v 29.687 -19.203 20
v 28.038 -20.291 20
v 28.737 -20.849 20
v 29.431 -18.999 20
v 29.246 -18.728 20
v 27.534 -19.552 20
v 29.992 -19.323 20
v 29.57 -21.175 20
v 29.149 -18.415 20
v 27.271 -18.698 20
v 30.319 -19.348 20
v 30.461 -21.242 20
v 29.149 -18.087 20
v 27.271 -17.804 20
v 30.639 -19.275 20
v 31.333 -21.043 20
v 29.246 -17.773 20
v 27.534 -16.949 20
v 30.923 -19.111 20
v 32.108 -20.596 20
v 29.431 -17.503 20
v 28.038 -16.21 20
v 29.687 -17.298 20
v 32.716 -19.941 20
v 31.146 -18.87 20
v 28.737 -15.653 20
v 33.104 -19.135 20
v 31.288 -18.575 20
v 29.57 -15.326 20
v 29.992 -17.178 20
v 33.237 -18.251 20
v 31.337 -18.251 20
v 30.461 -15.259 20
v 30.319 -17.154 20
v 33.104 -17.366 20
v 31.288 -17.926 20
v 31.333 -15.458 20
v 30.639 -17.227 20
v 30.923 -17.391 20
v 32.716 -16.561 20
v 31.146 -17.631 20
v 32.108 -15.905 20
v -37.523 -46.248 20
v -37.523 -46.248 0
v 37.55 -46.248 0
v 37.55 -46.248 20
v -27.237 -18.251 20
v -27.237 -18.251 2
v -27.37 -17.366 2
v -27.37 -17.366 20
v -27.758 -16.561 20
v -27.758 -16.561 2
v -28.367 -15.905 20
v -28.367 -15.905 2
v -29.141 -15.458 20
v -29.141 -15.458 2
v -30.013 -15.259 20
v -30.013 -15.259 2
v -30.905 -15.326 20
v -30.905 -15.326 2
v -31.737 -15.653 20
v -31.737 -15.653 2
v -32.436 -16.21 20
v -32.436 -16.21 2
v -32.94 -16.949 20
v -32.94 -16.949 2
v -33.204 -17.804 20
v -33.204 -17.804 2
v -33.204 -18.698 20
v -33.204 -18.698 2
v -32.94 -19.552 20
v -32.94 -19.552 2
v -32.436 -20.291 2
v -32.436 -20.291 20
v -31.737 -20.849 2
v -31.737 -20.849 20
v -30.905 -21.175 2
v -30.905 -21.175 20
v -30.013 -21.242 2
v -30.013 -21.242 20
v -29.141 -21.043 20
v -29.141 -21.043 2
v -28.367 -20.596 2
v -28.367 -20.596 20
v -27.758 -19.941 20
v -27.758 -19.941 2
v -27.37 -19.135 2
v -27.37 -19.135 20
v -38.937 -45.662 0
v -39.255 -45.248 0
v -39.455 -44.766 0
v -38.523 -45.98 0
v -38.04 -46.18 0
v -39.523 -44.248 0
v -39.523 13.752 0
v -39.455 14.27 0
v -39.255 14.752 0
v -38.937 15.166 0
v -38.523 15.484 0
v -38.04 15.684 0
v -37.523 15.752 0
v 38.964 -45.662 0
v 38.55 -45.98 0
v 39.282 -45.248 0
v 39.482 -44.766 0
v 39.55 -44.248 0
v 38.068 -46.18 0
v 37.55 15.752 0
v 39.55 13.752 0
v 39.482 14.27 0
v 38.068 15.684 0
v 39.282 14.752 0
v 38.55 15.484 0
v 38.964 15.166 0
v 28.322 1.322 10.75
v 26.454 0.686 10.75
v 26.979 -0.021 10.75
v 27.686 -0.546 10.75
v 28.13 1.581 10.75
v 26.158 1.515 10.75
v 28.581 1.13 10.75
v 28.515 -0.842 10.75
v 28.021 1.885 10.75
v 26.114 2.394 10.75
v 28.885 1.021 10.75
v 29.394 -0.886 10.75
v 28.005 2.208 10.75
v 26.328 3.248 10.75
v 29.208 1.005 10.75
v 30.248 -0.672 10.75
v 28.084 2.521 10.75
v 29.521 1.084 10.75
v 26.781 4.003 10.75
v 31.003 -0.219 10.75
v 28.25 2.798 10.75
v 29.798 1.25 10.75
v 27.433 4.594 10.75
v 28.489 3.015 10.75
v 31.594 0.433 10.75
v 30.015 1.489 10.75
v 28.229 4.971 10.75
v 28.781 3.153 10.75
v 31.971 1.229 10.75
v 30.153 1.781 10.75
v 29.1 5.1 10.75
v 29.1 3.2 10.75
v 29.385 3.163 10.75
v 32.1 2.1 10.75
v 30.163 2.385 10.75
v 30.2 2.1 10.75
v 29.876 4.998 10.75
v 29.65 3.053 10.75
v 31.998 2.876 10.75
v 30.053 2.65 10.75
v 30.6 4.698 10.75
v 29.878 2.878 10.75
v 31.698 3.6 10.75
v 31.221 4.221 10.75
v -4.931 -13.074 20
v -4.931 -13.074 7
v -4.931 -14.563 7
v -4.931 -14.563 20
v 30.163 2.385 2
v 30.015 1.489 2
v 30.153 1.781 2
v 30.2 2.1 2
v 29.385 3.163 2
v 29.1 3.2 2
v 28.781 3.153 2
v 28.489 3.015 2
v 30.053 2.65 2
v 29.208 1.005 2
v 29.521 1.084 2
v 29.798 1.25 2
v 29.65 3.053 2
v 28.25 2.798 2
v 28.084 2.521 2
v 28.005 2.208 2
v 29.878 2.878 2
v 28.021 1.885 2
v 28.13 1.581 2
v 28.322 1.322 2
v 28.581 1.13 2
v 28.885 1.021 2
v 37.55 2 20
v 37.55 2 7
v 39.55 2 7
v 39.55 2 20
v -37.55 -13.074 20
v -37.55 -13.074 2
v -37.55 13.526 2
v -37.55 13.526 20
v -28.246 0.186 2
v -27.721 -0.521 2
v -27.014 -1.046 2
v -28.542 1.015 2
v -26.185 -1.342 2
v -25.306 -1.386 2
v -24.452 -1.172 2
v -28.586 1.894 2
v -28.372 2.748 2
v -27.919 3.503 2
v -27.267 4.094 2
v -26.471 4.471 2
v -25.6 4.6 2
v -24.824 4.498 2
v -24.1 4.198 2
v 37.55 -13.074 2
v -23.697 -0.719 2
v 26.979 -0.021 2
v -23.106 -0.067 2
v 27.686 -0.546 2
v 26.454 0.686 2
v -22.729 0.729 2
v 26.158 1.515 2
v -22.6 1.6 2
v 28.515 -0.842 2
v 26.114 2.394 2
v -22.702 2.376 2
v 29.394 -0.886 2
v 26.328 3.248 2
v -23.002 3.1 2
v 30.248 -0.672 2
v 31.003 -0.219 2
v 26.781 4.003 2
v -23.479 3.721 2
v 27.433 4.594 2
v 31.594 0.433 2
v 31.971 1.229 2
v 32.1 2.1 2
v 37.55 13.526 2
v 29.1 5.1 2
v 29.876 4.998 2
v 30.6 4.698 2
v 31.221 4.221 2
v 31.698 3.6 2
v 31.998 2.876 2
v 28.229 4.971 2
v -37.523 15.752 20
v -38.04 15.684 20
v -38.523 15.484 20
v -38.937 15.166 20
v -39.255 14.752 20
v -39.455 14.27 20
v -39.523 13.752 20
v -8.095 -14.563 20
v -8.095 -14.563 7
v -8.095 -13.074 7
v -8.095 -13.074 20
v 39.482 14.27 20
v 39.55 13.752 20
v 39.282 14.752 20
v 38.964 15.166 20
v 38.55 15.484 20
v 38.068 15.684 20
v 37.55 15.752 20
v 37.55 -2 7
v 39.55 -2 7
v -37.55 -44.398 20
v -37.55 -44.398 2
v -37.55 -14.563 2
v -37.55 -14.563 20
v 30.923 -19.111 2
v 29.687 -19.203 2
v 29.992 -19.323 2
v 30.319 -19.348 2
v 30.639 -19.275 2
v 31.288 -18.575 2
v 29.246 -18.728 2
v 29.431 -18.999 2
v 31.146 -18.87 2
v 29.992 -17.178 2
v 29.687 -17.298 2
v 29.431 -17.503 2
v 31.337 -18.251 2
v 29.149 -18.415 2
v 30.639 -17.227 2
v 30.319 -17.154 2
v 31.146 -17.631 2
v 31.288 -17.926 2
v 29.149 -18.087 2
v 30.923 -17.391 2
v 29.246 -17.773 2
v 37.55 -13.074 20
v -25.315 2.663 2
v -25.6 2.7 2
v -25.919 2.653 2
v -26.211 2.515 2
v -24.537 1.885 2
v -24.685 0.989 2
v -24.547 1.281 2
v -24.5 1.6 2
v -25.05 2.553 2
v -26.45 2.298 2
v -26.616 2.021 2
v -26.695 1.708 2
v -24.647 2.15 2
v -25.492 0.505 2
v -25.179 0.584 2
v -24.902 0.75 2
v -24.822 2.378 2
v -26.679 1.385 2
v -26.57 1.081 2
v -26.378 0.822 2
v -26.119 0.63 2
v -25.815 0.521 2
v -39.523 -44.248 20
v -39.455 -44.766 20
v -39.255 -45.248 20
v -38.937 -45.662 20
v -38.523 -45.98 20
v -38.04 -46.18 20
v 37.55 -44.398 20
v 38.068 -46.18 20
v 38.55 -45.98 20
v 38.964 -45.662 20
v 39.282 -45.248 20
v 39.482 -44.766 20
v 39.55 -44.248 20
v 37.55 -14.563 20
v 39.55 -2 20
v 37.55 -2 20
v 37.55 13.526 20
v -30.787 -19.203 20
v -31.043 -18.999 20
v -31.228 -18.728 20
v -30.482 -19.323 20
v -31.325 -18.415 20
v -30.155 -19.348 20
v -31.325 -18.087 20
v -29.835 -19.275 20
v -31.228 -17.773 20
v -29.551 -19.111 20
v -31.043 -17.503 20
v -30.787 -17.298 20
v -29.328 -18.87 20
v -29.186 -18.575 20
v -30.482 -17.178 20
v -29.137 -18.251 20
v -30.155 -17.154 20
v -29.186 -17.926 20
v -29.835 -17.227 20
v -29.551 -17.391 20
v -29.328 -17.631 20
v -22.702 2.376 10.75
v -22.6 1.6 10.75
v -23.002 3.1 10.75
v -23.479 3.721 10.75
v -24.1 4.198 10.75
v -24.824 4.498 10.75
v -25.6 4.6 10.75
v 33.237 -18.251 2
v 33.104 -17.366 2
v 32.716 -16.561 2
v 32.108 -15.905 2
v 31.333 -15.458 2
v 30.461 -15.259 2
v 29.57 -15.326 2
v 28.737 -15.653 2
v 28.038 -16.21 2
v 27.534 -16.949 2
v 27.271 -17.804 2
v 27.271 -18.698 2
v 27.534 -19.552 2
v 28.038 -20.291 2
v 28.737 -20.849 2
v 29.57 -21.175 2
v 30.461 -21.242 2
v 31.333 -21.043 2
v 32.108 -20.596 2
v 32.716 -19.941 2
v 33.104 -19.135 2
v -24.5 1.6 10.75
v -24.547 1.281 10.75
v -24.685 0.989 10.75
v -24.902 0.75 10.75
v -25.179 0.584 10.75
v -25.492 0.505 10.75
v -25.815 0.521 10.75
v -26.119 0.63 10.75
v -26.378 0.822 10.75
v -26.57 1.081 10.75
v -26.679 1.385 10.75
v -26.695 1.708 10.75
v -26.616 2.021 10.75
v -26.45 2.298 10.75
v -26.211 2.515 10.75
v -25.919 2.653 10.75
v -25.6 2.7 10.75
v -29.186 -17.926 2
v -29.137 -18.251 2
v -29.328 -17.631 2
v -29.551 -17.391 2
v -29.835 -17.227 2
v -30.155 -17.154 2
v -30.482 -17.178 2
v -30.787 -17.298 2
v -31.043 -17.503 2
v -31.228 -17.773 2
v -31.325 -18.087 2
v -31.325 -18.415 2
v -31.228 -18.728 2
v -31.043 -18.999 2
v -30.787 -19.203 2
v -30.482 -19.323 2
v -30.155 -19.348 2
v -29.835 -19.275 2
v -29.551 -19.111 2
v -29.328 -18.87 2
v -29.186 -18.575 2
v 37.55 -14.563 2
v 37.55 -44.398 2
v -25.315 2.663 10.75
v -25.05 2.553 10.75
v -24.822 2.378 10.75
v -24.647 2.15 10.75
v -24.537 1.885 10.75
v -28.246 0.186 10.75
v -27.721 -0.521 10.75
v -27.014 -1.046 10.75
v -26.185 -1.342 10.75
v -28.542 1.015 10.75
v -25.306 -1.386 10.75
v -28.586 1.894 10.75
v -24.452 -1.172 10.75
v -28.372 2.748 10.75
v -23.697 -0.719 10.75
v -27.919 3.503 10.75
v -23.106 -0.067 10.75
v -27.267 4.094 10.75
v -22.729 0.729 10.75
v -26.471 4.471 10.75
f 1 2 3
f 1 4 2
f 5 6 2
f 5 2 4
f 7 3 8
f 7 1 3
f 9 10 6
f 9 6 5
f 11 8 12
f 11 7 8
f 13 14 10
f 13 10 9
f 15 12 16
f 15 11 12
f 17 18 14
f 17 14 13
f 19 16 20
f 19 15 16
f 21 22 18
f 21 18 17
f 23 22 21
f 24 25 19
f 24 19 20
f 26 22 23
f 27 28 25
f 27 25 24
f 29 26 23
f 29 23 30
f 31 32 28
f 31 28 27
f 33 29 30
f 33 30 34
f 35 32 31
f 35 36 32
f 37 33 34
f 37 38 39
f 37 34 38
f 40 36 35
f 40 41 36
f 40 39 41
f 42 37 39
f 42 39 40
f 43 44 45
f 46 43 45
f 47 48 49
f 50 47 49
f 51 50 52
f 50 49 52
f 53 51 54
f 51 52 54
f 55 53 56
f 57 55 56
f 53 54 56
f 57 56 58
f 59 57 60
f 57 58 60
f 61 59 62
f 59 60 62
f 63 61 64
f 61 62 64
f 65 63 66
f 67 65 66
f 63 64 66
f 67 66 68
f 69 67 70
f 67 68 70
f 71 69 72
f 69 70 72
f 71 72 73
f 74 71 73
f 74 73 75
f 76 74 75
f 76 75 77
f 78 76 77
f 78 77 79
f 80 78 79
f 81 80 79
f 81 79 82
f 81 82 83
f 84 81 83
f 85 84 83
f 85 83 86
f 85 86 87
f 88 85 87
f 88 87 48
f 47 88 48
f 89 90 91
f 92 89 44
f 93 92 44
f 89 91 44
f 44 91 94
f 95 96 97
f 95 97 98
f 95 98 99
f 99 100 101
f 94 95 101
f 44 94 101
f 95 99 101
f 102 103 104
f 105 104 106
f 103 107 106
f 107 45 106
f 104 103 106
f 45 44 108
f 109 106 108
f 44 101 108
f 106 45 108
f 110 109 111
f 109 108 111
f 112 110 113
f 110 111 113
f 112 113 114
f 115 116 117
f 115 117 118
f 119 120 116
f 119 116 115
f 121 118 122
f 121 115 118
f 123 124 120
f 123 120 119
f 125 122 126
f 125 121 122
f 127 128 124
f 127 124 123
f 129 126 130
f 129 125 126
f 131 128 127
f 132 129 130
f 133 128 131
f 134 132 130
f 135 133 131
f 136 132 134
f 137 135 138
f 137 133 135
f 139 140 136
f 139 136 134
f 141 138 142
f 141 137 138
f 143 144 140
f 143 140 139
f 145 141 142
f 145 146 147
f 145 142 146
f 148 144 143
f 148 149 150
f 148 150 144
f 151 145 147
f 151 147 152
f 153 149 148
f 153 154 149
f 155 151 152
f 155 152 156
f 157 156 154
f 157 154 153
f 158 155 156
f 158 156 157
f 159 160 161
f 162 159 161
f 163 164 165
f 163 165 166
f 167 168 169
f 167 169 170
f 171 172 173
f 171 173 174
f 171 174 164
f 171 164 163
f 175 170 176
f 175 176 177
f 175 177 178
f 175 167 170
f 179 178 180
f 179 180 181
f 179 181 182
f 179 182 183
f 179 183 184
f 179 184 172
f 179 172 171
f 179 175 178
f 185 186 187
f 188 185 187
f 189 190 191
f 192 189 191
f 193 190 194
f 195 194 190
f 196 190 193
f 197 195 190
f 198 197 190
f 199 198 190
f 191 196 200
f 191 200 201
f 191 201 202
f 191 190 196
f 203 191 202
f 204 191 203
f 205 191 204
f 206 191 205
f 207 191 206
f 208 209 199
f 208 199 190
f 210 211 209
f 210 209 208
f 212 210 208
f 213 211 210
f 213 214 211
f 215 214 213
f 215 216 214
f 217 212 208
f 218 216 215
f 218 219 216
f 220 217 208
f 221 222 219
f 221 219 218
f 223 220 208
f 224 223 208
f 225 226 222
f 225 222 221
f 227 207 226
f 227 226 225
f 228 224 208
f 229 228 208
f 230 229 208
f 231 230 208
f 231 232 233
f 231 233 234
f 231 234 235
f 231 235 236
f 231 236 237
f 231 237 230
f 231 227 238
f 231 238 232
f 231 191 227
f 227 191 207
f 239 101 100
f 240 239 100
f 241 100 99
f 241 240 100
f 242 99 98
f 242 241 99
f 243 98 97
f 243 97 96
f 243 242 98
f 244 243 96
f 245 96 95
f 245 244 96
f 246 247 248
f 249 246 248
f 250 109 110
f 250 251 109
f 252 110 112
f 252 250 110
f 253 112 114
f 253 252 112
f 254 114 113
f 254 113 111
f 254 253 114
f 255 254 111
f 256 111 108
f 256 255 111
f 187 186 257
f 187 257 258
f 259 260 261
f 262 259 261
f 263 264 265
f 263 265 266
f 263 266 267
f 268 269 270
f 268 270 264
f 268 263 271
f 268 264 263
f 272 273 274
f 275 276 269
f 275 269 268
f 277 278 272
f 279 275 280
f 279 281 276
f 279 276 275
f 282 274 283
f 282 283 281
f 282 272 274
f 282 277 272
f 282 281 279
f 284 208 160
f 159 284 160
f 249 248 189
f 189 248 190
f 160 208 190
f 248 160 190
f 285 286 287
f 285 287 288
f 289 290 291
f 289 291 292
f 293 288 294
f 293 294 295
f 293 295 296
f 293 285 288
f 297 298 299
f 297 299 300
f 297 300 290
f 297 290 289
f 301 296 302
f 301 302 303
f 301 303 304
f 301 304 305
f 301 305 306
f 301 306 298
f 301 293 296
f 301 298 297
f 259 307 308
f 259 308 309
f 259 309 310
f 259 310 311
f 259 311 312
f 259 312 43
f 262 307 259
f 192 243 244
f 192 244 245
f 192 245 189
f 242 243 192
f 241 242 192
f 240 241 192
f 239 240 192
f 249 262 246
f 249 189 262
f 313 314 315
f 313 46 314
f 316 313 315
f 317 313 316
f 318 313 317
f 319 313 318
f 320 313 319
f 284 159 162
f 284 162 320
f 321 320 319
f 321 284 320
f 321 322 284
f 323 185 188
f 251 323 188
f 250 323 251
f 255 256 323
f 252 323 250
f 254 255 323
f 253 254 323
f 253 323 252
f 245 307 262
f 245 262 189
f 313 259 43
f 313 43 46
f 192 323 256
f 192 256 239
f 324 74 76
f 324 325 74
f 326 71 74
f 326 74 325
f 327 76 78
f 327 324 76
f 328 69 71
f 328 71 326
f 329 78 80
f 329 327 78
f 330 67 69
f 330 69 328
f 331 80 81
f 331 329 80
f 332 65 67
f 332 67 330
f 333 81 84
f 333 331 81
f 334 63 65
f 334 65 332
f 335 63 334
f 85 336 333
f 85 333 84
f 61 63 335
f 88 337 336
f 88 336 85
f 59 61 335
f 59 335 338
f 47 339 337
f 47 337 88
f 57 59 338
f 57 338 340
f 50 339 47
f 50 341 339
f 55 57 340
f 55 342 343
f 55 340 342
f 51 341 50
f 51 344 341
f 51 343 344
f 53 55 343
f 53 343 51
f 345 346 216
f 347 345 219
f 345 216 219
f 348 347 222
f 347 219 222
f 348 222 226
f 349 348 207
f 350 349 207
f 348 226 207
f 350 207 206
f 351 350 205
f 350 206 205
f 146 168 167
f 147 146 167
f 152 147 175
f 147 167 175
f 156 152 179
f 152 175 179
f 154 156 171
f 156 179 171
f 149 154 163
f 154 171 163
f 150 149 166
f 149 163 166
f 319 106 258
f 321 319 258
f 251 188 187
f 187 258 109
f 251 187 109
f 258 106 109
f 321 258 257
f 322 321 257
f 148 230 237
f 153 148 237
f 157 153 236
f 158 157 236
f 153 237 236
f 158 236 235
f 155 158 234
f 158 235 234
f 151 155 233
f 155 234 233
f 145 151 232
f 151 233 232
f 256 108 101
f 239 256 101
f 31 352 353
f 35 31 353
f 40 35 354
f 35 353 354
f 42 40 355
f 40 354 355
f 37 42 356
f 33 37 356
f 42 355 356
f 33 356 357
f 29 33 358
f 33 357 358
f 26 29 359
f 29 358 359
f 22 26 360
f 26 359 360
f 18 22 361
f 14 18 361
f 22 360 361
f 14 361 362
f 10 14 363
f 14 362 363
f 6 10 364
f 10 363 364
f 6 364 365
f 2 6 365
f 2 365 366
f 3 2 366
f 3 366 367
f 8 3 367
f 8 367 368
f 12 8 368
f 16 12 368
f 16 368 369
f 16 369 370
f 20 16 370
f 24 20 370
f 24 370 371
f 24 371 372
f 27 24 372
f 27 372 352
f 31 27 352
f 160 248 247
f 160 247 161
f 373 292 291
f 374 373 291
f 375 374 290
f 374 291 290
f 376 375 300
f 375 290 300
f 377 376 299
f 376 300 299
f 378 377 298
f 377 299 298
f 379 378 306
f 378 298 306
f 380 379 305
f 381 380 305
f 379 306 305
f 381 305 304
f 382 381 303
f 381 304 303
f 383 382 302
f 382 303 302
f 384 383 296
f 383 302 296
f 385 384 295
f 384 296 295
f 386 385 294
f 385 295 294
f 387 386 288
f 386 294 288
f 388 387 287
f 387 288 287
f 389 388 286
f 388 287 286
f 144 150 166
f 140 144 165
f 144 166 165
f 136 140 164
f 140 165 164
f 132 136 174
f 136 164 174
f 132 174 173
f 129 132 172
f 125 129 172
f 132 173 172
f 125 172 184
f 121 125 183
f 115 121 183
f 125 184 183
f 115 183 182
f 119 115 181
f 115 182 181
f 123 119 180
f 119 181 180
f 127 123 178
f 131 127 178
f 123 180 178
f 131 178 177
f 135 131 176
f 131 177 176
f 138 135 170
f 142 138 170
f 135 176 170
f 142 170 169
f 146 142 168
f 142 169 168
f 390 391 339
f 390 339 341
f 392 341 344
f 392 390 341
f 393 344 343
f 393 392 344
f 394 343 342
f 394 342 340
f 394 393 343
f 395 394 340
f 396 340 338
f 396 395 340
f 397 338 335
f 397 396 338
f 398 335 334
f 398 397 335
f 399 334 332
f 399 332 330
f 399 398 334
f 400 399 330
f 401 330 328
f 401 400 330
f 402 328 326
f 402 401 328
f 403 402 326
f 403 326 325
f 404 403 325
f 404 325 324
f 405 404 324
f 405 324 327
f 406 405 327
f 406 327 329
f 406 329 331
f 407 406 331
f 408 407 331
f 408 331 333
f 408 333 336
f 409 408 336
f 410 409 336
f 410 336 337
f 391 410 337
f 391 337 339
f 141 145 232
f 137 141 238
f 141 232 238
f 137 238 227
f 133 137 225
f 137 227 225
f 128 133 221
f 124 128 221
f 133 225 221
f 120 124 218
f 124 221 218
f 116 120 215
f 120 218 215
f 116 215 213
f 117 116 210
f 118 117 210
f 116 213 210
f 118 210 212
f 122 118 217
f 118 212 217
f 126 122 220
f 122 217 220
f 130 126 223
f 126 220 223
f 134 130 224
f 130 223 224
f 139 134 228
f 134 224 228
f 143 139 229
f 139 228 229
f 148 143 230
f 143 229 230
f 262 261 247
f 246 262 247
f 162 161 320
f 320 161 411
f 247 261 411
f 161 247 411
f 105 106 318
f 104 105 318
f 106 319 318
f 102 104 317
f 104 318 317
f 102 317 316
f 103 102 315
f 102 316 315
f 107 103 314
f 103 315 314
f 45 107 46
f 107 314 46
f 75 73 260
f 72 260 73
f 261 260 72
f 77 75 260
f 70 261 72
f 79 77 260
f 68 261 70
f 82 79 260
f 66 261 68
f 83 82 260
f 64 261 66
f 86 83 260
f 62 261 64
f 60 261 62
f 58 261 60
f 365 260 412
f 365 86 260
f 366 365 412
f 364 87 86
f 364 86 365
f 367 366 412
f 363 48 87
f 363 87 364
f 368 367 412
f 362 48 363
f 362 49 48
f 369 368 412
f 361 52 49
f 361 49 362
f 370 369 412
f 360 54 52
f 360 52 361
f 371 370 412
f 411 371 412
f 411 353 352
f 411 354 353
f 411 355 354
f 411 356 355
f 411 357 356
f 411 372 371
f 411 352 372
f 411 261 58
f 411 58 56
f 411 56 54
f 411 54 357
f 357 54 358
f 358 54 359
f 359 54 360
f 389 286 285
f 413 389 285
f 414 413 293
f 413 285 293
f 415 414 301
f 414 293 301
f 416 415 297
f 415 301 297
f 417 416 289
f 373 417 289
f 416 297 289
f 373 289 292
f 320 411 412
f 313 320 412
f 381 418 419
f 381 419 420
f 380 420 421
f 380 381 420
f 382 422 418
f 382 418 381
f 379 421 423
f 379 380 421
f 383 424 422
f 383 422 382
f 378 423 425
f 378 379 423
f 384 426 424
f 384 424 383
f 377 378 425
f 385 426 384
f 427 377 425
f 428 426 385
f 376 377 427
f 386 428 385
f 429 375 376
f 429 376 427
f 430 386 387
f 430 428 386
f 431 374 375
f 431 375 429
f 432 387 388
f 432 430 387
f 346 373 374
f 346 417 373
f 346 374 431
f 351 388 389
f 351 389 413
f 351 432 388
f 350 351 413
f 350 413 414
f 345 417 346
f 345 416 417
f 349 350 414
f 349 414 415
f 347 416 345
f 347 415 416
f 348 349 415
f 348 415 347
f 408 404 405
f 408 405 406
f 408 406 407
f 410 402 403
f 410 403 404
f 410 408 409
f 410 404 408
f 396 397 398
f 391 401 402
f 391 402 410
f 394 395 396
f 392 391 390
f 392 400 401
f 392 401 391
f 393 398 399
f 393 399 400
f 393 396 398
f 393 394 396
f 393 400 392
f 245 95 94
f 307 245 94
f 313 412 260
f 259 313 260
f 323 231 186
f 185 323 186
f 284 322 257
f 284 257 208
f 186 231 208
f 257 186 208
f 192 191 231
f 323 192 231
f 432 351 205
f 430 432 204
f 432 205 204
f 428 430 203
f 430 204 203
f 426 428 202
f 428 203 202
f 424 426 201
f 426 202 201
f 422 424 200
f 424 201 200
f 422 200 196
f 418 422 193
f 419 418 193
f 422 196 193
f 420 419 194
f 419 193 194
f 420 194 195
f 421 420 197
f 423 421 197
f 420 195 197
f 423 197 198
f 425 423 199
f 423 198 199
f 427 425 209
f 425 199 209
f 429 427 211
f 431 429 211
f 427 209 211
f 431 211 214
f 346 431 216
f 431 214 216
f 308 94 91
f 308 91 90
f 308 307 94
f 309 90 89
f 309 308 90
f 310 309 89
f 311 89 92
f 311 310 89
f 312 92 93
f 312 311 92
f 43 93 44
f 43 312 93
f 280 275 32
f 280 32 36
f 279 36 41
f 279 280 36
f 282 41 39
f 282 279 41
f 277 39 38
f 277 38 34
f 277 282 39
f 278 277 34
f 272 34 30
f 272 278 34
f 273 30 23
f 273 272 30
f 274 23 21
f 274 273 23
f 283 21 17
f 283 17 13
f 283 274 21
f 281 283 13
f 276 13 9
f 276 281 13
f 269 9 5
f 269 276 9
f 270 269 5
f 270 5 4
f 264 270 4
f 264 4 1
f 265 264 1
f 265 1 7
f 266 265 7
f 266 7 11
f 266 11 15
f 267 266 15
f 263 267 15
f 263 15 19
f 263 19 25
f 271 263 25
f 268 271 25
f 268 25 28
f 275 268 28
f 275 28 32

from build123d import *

# Parameters (mm, degrees)
F1_DEPTH = 20
F0_R     = 3
F0_R_2   = 1.1
F2_DEPTH = 2
F3_DEPTH = 10.75
F0_W     = 3.1642657705
F0_H     = 1.4890261218
F4_DEPTH = 7
F5_R     = 2


# Not quite as in the source:
# - a feature names something its author has since deleted; it is built from what else it names


with BuildPart() as f1:
    # F0 (on Top) → F1 (new body)
    with BuildSketch(Plane.XY):
        Polygon((-37.55, -13.0740804598), (-37.55, -12.1), (-37.55, 13.5259195402), (37.55, 13.5259195402), (37.55, 2.0000108369), (39.55, 2.0000108369), (39.55, 15.7519578086), (-39.5226512551, 15.7519578086), (-39.5226512551, -46.2480421914), (39.55, -46.2480421914), (39.55, -1.9999891631), (37.55, -1.9999891631), (37.55, -13.0740804598), (-4.9305087887, -13.0740804598), (-4.9305087887, -14.5631065816), (36.1, -14.5631065816), (37.55, -14.5631065816), (37.55, -44.3981406778), (-37.55, -44.3981406778), (-37.55, -14.5631065816), (-36.1, -14.5631065816), (-8.0947745591, -14.5631065816), (-8.0947745591, -13.0740804598), align=None)
    extrude(amount=F1_DEPTH)



with BuildPart() as f1b:
    # F0 (on Top) → F1, piece 2 (new body)
    with BuildSketch(Plane.XY):
        with Locations((-30.2370786667, -18.2506926358)):
            Circle(F0_R)
        with Locations((-30.2370786667, -18.2506926358)):
            Circle(F0_R_2, mode=Mode.SUBTRACT)
    extrude(amount=F1_DEPTH)


with BuildPart() as f1c:
    # F0 (on Top) → F1, piece 3 (new body)
    with BuildSketch(Plane.XY):
        with Locations((30.2370786667, -18.2506926358)):
            Circle(F0_R)
        with Locations((30.2370786667, -18.2506926358)):
            Circle(F0_R_2, mode=Mode.SUBTRACT)
    extrude(amount=F1_DEPTH)


with BuildPart() as f2:
    # F0 (on Top) → F2 (new body)
    with BuildSketch(Plane.XY):
        with BuildLine():
            Line((-25.6, 1.6), (-25.6, 2.7))
            ThreePointArc((-25.6, 2.7), (-26.3778174593, 0.8221825407), (-24.5, 1.6))
            Line((-24.5, 1.6), (-25.6, 1.6))
        make_face()
        with BuildLine():
            ThreePointArc((-24.5, 1.6), (-24.8221825407, 2.3778174593), (-25.6, 2.7))
            Line((-25.6, 2.7), (-25.6, 1.6))
            Line((-25.6, 1.6), (-24.5, 1.6))
        make_face()
    extrude(amount=F2_DEPTH)


with BuildPart() as f2b:
    # F0 (on Top) → F2, piece 2 (new body)
    with BuildSketch(Plane.XY):
        with BuildLine():
            ThreePointArc((30.2, 2.1), (29.8778174593, 2.8778174593), (29.1, 3.2))
            ThreePointArc((29.1, 3.2), (28.3221825407, 1.3221825407), (30.2, 2.1))
        make_face()
    extrude(amount=F2_DEPTH)


with BuildPart() as f1_1:
    add(f1.part)

    add(f1b.part)  # F2#3 merges F1b

    add(f1c.part)  # F2#3 merges F1c
    # F0 (on Top) → F2, piece 3 (join)
    with BuildSketch(Plane.XY):
        Polygon((-4.9305087887, -14.5631065816), (-8.0947745591, -14.5631065816), (-36.1, -14.5631065816), (-36.1, -42.9981406778), (36.1, -42.9981406778), (36.1, -14.5631065816), align=None)
        with Locations((-30.2370786667, -18.2506926358)):
            Circle(F0_R, mode=Mode.SUBTRACT)
        with Locations((30.2370786667, -18.2506926358)):
            Circle(F0_R, mode=Mode.SUBTRACT)
        Polygon((-37.55, 13.5259195402), (-37.55, -12.1), (-37.55, -13.0740804598), (-8.0947745591, -13.0740804598), (-4.9305087887, -13.0740804598), (37.55, -13.0740804598), (37.55, -1.9999891631), (37.55, 2.0000108369), (37.55, 13.5259195402), align=None)
        Polygon((36.1, 12.1), (36.1, -12.1), (-36.1, -12.1), (-36.1, 12.1), (-25.6, 12.1), (29.1, 12.1), align=None, mode=Mode.SUBTRACT)
        Polygon((-36.1, -12.1), (36.1, -12.1), (36.1, 12.1), (29.1, 12.1), (-25.6, 12.1), (-36.1, 12.1), align=None)
        with BuildLine():
            ThreePointArc((-22.6, 1.6), (-27.7213203436, -0.5213203436), (-25.6, 4.6))
            ThreePointArc((-25.6, 4.6), (-23.4786796564, 3.7213203436), (-22.6, 1.6))
        make_face(mode=Mode.SUBTRACT)
        with BuildLine():
            ThreePointArc((32.1000297599, 2.1), (26.978658613, -0.021341387), (29.1, 5.1000297599))
            ThreePointArc((29.1, 5.1000297599), (31.221341387, 4.221341387), (32.1000297599, 2.1))
        make_face(mode=Mode.SUBTRACT)
        Polygon((-36.1, -42.9981406778), (-36.1, -14.5631065816), (-37.55, -14.5631065816), (-37.55, -44.3981406778), (37.55, -44.3981406778), (37.55, -14.5631065816), (36.1, -14.5631065816), (36.1, -42.9981406778), align=None)
        with Locations((-30.2370786667, -18.2506926358)):
            Circle(F0_R_2)
        with Locations((30.2370786667, -18.2506926358)):
            Circle(F0_R_2)
    extrude(amount=F2_DEPTH)


    add(f2.part)  # F3 merges F2

    add(f2b.part)  # F3 merges F2b
    # F0 (on Top) → F3 (join)
    with BuildSketch(Plane.XY):
        with BuildLine():
            Line((-25.6, 2.7), (-25.6, 4.6))
            ThreePointArc((-25.6, 4.6), (-27.7213203436, -0.5213203436), (-22.6, 1.6))
            Line((-22.6, 1.6), (-24.5, 1.6))
            ThreePointArc((-24.5, 1.6), (-26.3778174593, 0.8221825407), (-25.6, 2.7))
        make_face()
        with BuildLine():
            ThreePointArc((-22.6, 1.6), (-23.4786796564, 3.7213203436), (-25.6, 4.6))
            Line((-25.6, 4.6), (-25.6, 2.7))
            ThreePointArc((-25.6, 2.7), (-24.8221825407, 2.3778174593), (-24.5, 1.6))
            Line((-24.5, 1.6), (-22.6, 1.6))
        make_face()
        with BuildLine():
            ThreePointArc((32.1000297599, 2.1), (31.221341387, 4.221341387), (29.1, 5.1000297599))
            ThreePointArc((29.1, 5.1000297599), (26.978658613, -0.021341387), (32.1000297599, 2.1))
        make_face()
        with BuildLine():
            ThreePointArc((30.2, 2.1), (28.3221825407, 1.3221825407), (29.1, 3.2))
            ThreePointArc((29.1, 3.2), (29.8778174593, 2.8778174593), (30.2, 2.1))
        make_face(mode=Mode.SUBTRACT)
    extrude(amount=F3_DEPTH)

    # F0 (on Top) → F4 (join)
    with BuildSketch(Plane.XY):
        Polygon((39.55, 2.0000108369), (37.55, 2.0000108369), (37.55, -1.9999891631), (39.55, -1.9999891631), (39.55, 1.08369e-05), align=None)
        with Locations((-6.5126416739, -13.8185935207)):
            Rectangle(F0_W, F0_H)
    extrude(amount=F4_DEPTH)

    # F5
    f5_edges = [f1_1.edges().sort_by_distance(p)[0] for p in [
        (39.55, -46.248042, 10),
        (39.55, 15.751958, 10),
        (-39.522651, 15.751958, 10),
        (-39.522651, -46.248042, 10),
    ]]
    fillet(f5_edges, radius=F5_R)


solid = f1_1.part
